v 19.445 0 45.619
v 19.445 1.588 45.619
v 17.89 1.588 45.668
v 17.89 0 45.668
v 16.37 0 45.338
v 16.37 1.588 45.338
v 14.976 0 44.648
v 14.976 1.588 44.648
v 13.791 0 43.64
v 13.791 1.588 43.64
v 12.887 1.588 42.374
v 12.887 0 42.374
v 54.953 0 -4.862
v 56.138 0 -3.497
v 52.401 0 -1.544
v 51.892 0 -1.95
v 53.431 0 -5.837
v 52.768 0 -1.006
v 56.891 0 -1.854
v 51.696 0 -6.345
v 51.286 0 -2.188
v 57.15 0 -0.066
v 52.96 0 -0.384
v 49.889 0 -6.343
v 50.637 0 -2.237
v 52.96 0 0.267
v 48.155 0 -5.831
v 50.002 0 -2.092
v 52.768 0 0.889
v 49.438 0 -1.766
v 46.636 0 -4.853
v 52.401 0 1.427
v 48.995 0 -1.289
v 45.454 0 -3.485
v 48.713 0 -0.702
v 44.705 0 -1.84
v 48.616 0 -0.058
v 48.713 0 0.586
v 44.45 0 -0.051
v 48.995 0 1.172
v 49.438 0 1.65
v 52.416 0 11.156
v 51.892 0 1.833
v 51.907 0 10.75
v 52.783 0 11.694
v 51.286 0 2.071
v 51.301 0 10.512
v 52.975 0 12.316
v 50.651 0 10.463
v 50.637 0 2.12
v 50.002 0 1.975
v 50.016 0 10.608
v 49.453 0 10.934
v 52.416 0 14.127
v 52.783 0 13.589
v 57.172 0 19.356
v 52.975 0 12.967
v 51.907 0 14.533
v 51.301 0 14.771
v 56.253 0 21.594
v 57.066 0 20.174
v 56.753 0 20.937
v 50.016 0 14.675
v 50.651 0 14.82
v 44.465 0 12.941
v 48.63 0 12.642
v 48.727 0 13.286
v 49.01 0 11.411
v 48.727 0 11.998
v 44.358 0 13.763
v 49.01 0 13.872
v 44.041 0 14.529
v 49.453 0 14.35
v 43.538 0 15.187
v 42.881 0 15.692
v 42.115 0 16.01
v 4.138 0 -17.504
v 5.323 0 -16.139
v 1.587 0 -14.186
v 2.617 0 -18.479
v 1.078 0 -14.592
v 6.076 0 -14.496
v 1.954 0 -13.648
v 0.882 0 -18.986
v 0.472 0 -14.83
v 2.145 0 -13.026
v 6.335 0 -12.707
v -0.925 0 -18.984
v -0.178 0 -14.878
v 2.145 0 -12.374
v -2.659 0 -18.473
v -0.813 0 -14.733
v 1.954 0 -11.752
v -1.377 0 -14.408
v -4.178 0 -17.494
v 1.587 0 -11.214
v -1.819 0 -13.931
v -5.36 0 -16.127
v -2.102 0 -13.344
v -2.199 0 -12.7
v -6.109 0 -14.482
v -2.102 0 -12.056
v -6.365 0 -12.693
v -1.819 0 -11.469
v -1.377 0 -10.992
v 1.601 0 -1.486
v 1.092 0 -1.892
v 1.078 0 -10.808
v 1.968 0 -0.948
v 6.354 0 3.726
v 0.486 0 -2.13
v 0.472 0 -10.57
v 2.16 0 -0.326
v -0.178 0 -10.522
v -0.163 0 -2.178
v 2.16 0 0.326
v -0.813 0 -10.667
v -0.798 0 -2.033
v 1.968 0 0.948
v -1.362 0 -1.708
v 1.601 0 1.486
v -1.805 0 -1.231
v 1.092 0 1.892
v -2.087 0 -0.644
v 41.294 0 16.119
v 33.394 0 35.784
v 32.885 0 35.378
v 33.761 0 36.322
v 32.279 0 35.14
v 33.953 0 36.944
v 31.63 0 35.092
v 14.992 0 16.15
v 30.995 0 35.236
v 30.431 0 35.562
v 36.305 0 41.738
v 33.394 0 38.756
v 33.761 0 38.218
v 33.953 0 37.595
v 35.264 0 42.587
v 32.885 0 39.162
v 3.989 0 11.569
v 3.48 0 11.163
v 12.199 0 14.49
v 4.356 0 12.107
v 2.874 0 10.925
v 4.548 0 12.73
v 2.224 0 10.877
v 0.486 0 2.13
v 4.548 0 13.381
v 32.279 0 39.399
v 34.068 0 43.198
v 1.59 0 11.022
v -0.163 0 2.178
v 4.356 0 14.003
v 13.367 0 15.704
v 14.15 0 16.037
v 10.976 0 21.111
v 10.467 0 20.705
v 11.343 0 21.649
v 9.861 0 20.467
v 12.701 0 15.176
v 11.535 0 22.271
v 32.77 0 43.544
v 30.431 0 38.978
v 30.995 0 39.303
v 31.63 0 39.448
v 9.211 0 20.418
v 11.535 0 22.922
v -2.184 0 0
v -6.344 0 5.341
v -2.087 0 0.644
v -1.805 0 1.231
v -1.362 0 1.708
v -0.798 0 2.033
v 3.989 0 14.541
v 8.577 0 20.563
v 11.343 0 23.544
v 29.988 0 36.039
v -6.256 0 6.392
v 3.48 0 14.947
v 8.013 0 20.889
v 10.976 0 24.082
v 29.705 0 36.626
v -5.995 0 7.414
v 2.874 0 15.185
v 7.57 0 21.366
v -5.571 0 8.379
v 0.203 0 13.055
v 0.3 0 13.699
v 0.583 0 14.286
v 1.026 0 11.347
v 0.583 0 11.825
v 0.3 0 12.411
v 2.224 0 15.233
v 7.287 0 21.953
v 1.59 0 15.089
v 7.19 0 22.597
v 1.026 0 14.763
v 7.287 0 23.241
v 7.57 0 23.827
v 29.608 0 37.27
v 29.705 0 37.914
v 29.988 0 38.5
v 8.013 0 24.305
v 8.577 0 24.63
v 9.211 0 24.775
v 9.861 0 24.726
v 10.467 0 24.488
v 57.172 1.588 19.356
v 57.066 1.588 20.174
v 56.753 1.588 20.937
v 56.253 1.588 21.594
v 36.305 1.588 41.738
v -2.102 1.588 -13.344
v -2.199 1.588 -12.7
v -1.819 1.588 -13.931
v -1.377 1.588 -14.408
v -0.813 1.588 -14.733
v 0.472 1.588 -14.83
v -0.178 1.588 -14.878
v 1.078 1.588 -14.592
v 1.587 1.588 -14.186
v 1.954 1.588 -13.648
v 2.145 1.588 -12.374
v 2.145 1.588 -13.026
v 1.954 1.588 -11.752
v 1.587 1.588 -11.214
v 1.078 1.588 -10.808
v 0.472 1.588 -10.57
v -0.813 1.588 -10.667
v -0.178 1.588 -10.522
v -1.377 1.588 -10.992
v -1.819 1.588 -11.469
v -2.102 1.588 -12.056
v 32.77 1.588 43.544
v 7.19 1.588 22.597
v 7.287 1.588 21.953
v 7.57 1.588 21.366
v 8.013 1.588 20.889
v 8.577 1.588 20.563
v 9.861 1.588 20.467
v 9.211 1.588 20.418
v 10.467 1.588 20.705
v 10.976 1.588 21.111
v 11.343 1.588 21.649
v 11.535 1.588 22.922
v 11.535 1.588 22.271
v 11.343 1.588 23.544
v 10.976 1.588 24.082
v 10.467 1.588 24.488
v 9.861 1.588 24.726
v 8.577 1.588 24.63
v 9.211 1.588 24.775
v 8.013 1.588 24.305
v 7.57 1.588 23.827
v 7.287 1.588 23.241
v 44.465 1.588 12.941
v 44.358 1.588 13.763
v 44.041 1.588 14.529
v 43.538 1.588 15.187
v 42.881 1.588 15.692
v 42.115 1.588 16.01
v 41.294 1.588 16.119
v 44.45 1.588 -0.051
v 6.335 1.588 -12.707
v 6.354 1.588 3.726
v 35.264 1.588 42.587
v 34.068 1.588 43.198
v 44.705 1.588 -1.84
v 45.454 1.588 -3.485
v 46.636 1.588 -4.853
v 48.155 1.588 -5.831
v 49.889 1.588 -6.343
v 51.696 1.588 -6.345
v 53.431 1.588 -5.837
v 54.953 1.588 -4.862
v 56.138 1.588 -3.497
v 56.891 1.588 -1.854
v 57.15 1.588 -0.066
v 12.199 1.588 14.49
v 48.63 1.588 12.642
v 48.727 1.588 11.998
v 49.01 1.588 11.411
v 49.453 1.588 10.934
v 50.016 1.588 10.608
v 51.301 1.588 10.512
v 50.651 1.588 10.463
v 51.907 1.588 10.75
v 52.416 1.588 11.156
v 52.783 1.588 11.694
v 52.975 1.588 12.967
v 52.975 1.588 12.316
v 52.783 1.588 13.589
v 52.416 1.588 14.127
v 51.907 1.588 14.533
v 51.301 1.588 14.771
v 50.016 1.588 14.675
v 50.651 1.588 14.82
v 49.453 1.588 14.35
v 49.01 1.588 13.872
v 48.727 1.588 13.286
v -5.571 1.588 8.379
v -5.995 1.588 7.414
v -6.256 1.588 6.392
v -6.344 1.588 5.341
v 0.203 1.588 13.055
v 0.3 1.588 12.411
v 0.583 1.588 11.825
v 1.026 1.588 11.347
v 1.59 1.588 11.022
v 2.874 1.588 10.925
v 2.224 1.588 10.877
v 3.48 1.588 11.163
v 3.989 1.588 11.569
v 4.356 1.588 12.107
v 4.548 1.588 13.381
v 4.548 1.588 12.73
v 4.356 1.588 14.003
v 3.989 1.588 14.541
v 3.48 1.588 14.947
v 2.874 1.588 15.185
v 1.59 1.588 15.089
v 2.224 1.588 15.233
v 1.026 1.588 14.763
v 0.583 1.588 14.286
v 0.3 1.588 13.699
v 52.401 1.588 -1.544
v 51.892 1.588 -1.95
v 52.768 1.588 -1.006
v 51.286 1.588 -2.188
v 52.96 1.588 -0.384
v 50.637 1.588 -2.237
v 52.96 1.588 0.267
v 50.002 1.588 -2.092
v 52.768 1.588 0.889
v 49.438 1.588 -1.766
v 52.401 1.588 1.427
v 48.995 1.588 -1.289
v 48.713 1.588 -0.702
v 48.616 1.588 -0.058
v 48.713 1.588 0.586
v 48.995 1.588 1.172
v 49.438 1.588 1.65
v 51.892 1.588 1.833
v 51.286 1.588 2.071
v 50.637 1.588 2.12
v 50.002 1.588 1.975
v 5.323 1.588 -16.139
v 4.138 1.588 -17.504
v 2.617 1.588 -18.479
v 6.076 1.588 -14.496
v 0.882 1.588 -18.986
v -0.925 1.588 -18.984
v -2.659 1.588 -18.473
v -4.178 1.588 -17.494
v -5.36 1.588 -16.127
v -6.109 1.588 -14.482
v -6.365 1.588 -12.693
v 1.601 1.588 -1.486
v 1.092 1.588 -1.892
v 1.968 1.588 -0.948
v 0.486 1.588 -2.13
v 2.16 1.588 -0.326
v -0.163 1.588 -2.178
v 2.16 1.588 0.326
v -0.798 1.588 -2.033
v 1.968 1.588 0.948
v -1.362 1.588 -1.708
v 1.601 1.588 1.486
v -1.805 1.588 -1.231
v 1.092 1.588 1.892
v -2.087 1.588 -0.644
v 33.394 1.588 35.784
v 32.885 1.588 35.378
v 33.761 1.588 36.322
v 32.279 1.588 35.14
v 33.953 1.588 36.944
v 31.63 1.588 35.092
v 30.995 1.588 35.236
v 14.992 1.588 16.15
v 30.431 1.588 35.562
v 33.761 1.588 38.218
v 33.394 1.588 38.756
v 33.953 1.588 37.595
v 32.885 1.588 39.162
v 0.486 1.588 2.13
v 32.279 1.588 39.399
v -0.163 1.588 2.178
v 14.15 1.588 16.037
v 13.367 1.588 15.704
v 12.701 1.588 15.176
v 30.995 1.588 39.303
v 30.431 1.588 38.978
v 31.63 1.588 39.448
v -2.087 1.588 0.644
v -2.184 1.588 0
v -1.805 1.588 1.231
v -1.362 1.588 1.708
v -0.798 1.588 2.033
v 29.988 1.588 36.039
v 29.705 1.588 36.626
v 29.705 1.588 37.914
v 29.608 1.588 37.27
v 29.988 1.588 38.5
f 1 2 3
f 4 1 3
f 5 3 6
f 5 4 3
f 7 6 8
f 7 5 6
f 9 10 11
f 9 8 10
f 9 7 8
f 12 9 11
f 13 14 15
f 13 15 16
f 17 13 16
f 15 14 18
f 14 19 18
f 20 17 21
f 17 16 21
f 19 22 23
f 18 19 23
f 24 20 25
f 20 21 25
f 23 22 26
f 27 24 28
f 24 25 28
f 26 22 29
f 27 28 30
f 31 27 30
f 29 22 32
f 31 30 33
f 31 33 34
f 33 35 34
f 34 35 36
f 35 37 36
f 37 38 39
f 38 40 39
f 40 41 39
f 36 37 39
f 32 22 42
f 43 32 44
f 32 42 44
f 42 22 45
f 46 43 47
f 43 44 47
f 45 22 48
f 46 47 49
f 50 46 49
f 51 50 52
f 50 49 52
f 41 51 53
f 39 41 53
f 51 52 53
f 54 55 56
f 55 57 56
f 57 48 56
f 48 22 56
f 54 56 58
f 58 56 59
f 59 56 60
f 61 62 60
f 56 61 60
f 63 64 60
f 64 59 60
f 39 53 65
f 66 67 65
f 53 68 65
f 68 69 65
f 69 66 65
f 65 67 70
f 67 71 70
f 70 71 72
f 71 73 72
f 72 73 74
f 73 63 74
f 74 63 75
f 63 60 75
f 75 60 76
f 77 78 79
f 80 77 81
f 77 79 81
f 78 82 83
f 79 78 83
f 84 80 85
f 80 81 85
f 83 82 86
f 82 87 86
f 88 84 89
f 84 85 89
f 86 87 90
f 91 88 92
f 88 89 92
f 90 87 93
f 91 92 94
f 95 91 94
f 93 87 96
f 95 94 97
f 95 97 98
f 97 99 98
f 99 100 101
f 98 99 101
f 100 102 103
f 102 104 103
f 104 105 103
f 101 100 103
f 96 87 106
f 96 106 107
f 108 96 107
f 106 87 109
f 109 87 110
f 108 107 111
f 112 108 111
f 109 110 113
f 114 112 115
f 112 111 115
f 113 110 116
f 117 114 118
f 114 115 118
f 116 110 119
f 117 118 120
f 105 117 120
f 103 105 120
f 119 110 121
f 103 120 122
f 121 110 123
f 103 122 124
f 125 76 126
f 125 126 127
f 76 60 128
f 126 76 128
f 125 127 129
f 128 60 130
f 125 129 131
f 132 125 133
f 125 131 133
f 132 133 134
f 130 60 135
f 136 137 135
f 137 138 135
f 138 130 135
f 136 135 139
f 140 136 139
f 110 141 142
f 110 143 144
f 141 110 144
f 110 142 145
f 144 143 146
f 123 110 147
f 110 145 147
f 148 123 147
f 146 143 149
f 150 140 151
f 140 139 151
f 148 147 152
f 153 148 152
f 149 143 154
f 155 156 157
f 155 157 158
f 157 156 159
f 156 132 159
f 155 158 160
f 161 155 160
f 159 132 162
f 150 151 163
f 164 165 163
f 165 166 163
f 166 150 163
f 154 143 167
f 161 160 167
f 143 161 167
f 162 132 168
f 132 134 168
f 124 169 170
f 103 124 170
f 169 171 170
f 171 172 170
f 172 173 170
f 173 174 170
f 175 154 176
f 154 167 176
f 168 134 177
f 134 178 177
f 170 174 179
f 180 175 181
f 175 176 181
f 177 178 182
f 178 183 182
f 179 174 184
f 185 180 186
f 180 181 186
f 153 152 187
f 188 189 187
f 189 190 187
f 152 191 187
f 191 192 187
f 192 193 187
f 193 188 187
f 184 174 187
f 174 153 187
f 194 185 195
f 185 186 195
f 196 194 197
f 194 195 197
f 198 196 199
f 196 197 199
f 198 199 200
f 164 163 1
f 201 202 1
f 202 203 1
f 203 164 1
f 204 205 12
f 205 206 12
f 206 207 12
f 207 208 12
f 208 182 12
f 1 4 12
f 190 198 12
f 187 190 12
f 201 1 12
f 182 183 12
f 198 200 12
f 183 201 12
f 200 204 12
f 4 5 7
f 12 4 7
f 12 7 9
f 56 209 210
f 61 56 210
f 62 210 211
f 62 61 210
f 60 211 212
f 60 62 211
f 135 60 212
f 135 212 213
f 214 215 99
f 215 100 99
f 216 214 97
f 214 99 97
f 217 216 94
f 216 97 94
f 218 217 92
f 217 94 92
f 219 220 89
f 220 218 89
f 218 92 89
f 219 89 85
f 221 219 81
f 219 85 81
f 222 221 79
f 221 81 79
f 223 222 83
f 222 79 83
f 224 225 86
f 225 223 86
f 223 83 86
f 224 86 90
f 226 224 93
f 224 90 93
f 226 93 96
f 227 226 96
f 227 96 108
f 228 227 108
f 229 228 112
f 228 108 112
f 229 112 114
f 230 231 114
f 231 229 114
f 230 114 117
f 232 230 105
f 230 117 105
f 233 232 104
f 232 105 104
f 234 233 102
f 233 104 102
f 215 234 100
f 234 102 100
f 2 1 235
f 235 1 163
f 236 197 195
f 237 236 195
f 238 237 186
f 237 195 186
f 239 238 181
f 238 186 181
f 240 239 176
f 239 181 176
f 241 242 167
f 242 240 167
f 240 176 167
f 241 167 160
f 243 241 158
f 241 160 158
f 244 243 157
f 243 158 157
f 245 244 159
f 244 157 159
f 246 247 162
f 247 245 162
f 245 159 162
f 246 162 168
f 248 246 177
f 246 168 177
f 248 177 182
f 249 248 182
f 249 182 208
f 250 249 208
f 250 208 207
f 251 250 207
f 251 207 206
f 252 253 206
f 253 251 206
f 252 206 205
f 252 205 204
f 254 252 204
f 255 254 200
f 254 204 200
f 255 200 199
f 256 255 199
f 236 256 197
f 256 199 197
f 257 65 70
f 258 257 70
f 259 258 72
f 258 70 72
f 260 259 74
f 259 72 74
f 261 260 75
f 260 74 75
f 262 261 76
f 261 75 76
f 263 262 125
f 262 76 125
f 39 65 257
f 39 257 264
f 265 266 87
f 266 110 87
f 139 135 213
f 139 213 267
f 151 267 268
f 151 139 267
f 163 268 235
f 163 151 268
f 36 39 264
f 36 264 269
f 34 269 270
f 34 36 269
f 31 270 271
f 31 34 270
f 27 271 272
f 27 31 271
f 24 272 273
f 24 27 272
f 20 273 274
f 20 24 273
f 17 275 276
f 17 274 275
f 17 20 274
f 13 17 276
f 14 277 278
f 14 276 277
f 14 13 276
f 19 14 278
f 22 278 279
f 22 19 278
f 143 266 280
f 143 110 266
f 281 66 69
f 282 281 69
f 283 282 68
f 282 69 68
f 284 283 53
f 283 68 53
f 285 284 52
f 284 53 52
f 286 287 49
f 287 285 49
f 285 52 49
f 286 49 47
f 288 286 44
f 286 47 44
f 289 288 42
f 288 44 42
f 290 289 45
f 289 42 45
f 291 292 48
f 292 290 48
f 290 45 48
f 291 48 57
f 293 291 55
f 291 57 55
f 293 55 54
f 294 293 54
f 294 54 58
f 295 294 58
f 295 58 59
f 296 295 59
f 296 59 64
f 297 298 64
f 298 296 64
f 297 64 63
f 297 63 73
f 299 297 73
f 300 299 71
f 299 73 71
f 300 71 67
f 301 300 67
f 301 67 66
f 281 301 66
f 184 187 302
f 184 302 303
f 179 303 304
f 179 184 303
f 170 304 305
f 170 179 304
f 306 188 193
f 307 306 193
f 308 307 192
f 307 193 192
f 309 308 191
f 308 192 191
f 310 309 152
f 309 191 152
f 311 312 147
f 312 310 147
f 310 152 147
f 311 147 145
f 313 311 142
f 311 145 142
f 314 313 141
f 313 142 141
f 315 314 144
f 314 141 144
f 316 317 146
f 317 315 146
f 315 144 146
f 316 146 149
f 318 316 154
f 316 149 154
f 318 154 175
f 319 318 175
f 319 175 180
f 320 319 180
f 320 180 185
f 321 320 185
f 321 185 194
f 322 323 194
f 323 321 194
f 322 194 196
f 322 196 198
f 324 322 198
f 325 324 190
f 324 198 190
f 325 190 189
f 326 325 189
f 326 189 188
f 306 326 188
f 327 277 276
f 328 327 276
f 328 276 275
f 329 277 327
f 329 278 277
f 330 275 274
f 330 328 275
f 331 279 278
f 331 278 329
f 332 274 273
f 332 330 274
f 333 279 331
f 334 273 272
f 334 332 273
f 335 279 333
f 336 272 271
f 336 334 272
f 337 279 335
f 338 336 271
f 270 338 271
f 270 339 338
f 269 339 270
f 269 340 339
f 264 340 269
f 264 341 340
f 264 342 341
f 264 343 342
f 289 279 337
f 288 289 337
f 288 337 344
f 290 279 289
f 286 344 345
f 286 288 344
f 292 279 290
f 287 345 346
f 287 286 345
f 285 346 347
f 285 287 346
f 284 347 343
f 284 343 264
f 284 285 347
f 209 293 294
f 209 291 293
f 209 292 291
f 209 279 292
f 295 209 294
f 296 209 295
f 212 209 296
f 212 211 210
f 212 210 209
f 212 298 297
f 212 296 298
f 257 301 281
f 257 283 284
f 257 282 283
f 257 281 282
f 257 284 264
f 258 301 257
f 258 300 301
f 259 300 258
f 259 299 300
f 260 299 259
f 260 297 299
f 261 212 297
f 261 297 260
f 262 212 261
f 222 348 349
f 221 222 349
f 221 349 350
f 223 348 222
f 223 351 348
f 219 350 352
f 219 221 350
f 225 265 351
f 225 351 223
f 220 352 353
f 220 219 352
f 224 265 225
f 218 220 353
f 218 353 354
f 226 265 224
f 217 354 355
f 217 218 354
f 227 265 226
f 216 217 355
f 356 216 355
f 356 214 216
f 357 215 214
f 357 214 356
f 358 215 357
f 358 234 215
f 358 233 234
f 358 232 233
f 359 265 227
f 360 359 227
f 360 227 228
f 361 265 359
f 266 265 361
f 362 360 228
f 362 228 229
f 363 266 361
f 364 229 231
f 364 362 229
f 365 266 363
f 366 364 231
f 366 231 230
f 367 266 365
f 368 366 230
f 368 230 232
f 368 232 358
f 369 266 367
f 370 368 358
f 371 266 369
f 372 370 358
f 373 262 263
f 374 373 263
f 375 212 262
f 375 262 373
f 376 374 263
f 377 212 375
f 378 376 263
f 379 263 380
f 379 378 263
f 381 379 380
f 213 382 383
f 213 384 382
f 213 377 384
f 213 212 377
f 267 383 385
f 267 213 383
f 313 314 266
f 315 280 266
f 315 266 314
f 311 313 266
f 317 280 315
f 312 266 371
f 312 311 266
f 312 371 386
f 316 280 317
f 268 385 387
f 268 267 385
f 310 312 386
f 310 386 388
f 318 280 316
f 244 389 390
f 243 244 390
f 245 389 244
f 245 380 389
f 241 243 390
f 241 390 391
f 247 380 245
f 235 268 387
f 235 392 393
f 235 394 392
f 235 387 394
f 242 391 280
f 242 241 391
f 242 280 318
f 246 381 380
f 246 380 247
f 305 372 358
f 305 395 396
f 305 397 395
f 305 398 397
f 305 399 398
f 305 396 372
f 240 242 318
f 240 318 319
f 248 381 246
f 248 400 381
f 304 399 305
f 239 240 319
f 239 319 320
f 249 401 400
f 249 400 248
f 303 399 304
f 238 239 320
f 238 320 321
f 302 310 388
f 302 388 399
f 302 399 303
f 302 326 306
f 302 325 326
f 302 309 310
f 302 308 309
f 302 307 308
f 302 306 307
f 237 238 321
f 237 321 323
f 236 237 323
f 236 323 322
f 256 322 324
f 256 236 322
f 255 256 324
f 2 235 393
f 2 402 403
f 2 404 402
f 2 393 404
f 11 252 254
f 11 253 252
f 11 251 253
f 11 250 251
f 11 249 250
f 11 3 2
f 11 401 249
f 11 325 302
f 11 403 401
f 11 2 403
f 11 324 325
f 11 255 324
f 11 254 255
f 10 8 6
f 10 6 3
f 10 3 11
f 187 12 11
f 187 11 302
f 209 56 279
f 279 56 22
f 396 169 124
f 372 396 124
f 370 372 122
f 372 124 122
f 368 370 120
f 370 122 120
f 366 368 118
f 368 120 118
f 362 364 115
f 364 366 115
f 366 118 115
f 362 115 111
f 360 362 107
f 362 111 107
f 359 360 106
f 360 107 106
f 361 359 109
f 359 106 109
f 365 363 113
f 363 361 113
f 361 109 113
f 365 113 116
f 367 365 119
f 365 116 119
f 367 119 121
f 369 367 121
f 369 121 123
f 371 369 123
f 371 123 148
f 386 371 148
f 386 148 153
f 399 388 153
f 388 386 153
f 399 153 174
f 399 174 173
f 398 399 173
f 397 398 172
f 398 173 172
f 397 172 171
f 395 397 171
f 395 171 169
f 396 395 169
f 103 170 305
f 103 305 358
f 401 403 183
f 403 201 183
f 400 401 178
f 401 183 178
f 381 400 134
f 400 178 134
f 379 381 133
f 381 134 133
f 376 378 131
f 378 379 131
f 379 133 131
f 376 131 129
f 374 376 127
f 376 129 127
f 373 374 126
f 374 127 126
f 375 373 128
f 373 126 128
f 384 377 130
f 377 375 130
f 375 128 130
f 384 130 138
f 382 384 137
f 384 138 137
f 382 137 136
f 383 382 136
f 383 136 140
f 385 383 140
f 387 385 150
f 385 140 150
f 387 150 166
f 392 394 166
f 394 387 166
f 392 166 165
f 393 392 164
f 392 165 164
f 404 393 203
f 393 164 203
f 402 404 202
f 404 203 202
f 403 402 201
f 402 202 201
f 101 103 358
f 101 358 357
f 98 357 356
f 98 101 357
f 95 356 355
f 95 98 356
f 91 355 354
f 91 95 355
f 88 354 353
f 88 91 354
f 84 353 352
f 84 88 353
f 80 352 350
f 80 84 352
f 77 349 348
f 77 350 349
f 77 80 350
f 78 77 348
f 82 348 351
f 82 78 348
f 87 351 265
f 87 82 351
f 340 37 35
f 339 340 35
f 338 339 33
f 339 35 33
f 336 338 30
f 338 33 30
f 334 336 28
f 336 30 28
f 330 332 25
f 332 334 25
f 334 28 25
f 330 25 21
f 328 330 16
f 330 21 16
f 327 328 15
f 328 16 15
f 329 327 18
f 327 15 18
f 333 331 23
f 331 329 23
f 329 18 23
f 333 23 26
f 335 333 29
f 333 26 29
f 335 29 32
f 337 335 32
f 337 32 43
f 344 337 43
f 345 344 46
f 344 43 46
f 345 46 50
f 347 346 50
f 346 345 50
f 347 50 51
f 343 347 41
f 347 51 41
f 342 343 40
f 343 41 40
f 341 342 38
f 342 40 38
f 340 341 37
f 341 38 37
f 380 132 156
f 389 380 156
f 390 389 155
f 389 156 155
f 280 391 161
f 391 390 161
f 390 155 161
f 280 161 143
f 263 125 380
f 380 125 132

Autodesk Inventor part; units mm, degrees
ref_plane "YZ Plane" through (0, 0, 0) normal (1, 0, 0) x (0, 1, 0)
ref_plane "XZ Plane" through (0, 0, 0) normal (0, 1, 0) x (-1, 0, 0)
ref_plane "XY Plane" through (0, 0, 0) normal (0, 0, 1) x (1, 0, 0)
sketch "main" plane through (0, 0, 0) normal (0, 0, 1) x (1, 0, 0)
  circle A0 centre (12.325875, 33.112504) radius 2.1844
  line L0 (25.390984, 29.120631) -> (25.316771, 29.135118)
  line L1 (20.04973, 41.835118) -> (13.667964, 35.453352) construction
  arc A1 (20.04973, 41.835118) -> (17.011045, 41.065244) centre (20.04973, 35.453352) ccw
  circle A2 centre (25.38373, 35.485118) radius 2.1844
  line L2 (20.04973, 41.835118) -> (29.074911, 41.835118) construction
  arc A3 (25.38373, 41.835118) -> (25.38373, 41.835118) centre (25.38373, 35.485118) ccw
  circle A4 centre (12.68373, -15.314882) radius 2.1844
  circle A5 centre (-11.92252, 3.735118) radius 2.1844
  arc A6 (-18.198047, 2.765449) -> (-16.395825, -0.77177) centre (-11.92252, 3.735118) ccw
  line L3 (-20.257316, 16.092677) -> (-18.198047, 2.765449)
  line L4 (12.391865, -8.964882) -> (25.38373, -8.964882)
  circle A7 centre (25.38373, -15.314882) radius 2.1844
  arc A8 (25.38373, -21.664882) -> (25.38373, -8.964882) centre (25.38373, -15.314882) ccw
  line L5 (5.962319, -21.664882) -> (25.38373, -21.664882)
  line L6 (3.725666, -20.743326) -> (-16.395825, -0.77177)
  line L7 (21.760398, 29.194623) -> (10.880086, 23.303233)
  line L8 (-17.005348, 22.646303) -> (17.011045, 41.065244)
  circle A9 centre (2.776273, 26.136374) radius 2.1844
  arc A10 (-17.005348, 22.646303) -> (-20.257316, 16.092677) centre (-13.981788, 17.062345) ccw
  line L9 (9.216865, -5.789882) -> (9.216865, 20.511254)
  arc A11 (9.216865, -5.789882) -> (12.391865, -8.964882) centre (12.391865, -5.789882) ccw
  arc A12 (10.880086, 23.303233) -> (9.216865, 20.511254) centre (12.391865, 20.511254) ccw
  arc A13 (3.725666, -20.743326) -> (5.962319, -21.664882) centre (5.962319, -18.489882) ccw
  arc A14 (38.08373, 29.135118) -> (38.08373, 41.835118) centre (38.08373, 35.485118) ccw
  line L10 (20.04973, 41.835118) -> (38.08373, 41.835118)
  line L11 (21.650503, 29.135118) -> (38.08373, 29.135118)
  circle A15 centre (38.08373, 35.485118) radius 2.184401
  point P0 (7.427211, 10.378199)
  point P1 (19.03373, 40.819118)
  point P2 (-20.9407, 20.515419)
  point P3 (9.216865, -8.964882)
  point P4 (-30.17877, -11.346132)
  dimension "d0" = 4.3688
  dimension "d2" = 12.7
  dimension "d3" = 6.35
  dimension "d4" = 12.7
  dimension "d5" = 4.3688
  dimension "d6" = 4.3688
  dimension "d9" = 6.35
  dimension "d10" = 31.75
  dimension "d11" = 37.30625
  dimension "d16" = 6.35
  dimension "d18" = 3.175
  dimension "d21" = 4.7625
  dimension "d22" = 3.175
  dimension "d23" = 12.7
  dimension "d24" = 12.7
  dimension "d25" = 6.35
  dimension "d26" = 13.32723
sketch "Sketch1" plane through (0, 0, 0) normal (0, 1, 0) x (-1, 0, 0)
  circle A0 centre (-2.387595, 13.055125) radius 2.1844
  line L0 (-6.364475, -0.014556) -> (-6.350073, 0.059673)
  line L1 (6.343876, 5.341282) -> (-0.045209, 11.715722) construction
  arc A1 (6.343876, 5.341282) -> (5.570516, 8.379082) centre (-0.037886, 5.33396) ccw
  circle A2 centre (0, 0) radius 2.1844
  line L2 (6.343876, 5.341282) -> (6.354231, -3.683892) construction
  arc A3 (6.349996, 0.007286) -> (6.349996, 0.007286) centre (0, 0) ccw
  circle A4 centre (-50.814538, 12.641705) radius 2.1844
  circle A5 centre (-31.792784, 37.269796) radius 2.1844
  arc A6 (-32.769652, 43.544207) -> (-36.304801, 41.737927) centre (-31.792784, 37.269796) ccw
  line L3 (-19.444796, 45.618765) -> (-32.769652, 43.544207)
  line L4 (-44.464877, 12.940855) -> (-44.449971, -0.051001)
  circle A7 centre (-50.799967, -0.058287) radius 2.1844
  arc A8 (-57.149962, -0.065573) -> (-44.449971, -0.051001) centre (-50.799967, -0.058287) ccw
  line L5 (-57.172246, 19.355826) -> (-57.149962, -0.065573)
  line L6 (-56.253257, 21.593534) -> (-36.304801, 41.737927)
  line L7 (-6.294648, 3.616113) -> (-12.198518, 14.489658)
  line L8 (-12.887443, 42.374319) -> (5.570516, 8.379082)
  circle A9 centre (-9.374677, 22.596715) radius 2.1844
  arc A10 (-12.887443, 42.374319) -> (-19.444796, 45.618765) centre (-18.467928, 39.344355) ccw
  line L9 (-41.293522, 16.119496) -> (-14.992403, 16.149674)
  arc A11 (-41.293522, 16.119496) -> (-44.464877, 12.940855) centre (-41.289879, 12.944498) ccw
  arc A12 (-12.198518, 14.489658) -> (-14.992403, 16.149674) centre (-14.98876, 12.974676) ccw
  arc A13 (-56.253257, 21.593534) -> (-57.172246, 19.355826) centre (-53.997248, 19.359469) ccw
  arc A14 (-6.335424, -12.707278) -> (6.364568, -12.692706) centre (0.014572, -12.699992) ccw
  line L10 (6.343876, 5.341282) -> (6.364568, -12.692706)
  line L11 (-6.354279, 3.725939) -> (-6.335424, -12.707278)
  circle A15 centre (0.014572, -12.699992) radius 2.184401
  point P0 (0, 0)
extrude "Extrusion1" add sketch "Sketch1" along normal blind 1.5875
properties part number "Ring Funnel" material "Acetal Resin, White"
